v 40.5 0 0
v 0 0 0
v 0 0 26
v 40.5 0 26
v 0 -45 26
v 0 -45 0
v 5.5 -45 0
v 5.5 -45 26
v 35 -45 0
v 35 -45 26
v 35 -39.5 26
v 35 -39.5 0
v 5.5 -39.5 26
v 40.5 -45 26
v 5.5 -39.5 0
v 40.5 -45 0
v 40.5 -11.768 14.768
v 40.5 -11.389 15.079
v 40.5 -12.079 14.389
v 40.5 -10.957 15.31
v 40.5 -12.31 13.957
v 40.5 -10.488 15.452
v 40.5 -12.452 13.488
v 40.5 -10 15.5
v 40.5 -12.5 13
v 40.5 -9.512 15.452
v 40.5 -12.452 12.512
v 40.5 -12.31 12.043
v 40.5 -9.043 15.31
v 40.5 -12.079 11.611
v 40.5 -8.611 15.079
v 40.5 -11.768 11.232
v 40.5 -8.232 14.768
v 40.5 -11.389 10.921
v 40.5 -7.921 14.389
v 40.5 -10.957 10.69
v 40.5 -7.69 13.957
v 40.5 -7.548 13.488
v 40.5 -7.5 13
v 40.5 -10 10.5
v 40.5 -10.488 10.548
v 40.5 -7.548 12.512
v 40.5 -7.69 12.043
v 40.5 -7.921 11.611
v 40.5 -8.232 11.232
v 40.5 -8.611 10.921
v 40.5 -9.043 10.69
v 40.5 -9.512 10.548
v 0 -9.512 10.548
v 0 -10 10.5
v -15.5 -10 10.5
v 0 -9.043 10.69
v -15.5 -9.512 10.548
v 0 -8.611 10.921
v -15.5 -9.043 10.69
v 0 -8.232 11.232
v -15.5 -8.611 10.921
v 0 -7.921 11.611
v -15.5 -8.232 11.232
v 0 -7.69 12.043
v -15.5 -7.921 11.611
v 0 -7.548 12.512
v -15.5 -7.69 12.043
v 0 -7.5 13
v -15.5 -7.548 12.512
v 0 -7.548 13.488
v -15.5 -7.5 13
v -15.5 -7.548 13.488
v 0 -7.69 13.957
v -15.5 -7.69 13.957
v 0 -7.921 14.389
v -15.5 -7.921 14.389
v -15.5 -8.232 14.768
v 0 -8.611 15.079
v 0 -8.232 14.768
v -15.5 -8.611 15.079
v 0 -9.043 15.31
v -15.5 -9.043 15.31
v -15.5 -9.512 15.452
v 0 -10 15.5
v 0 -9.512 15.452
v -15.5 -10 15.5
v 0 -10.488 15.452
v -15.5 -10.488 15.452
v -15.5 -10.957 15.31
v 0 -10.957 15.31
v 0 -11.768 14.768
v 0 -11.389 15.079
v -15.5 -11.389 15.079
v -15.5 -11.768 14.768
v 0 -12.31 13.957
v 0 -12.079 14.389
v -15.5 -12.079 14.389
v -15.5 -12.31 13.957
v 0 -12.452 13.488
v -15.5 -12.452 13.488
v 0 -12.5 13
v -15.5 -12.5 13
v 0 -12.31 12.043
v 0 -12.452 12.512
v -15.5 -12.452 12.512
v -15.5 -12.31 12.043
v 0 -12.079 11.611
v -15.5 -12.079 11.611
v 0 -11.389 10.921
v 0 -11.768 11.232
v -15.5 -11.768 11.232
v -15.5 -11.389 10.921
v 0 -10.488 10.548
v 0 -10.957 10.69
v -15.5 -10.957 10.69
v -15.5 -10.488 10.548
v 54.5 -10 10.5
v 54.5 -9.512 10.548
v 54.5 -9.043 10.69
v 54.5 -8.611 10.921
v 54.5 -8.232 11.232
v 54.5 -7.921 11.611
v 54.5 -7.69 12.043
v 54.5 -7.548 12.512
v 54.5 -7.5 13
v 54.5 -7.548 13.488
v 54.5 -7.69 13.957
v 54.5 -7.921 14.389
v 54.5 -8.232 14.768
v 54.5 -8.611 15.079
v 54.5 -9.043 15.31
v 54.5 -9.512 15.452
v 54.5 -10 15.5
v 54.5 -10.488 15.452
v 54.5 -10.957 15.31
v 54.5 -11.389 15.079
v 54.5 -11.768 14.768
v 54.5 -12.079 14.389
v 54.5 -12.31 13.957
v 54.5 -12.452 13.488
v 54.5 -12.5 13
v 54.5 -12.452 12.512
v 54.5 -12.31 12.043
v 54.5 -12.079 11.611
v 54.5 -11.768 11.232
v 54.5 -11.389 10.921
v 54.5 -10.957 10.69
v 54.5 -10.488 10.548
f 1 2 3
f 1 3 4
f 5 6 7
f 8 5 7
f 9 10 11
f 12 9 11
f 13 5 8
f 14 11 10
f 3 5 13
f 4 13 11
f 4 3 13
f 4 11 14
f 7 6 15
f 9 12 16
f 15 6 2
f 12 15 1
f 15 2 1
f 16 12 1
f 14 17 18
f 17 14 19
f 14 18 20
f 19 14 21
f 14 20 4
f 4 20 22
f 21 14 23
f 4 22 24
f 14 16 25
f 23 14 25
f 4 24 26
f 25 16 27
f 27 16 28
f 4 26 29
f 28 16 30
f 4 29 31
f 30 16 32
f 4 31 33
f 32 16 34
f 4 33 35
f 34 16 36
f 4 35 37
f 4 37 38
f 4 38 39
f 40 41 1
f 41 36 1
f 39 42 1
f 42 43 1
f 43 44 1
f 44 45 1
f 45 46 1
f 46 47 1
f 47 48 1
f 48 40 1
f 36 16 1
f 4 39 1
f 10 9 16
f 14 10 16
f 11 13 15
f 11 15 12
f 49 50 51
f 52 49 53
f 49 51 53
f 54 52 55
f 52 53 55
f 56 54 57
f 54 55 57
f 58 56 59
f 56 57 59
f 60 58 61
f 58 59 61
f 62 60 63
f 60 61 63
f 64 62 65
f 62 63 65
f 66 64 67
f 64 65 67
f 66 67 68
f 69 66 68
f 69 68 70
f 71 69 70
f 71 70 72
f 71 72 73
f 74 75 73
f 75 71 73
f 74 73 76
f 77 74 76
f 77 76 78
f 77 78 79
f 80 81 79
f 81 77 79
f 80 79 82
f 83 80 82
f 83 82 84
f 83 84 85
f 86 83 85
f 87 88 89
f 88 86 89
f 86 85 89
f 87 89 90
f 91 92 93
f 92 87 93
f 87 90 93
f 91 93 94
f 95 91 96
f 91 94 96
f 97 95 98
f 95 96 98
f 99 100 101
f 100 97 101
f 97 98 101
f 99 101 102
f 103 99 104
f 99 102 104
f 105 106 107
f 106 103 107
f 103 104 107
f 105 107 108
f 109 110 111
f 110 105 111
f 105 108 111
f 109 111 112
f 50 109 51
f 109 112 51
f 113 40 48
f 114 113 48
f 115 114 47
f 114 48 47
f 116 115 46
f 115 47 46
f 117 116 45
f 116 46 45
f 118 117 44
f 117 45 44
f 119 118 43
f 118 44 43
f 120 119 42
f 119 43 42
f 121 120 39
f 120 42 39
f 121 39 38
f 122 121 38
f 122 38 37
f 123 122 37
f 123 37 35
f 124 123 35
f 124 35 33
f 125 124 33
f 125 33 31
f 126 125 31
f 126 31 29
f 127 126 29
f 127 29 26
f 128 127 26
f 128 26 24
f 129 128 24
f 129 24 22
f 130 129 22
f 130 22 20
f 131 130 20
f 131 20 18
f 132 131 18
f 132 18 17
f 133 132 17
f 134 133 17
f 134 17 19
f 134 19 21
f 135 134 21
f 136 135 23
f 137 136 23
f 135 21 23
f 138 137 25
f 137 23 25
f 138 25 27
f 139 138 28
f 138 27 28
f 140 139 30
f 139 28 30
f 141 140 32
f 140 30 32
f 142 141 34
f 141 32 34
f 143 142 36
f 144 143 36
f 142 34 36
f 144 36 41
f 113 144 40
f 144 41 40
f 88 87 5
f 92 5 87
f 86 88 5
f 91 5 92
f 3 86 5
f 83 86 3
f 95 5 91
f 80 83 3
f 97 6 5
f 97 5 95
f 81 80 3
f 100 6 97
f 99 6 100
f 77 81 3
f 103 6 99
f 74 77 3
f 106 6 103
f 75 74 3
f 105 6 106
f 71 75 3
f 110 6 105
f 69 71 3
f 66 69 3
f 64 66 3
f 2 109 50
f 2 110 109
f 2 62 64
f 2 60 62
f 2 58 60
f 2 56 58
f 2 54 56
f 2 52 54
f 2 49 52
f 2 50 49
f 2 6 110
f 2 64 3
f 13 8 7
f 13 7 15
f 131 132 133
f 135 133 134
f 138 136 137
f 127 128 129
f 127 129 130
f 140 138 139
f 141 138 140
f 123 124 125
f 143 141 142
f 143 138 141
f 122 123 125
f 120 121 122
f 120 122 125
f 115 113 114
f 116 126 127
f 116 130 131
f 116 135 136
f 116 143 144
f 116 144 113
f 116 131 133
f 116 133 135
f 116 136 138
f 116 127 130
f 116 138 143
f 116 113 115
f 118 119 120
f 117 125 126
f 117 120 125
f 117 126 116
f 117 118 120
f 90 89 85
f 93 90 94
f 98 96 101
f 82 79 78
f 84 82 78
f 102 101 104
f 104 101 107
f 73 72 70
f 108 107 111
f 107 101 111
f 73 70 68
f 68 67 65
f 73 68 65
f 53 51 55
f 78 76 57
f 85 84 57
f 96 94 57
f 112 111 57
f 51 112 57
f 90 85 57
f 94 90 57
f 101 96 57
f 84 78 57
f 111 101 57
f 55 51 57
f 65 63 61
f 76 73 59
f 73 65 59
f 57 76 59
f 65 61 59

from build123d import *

# Parameters (mm, degrees)
SKETCH_1_W           = 40.5
SKETCH_1_H           = 45
EXTRUDE_1_DEPTH      = 26
SKETCH_2_W           = 29.5
SKETCH_2_H           = 5.5
CUT_EXTRUDE_1_DEPTH  = 38
EXTRUDE_2_DEPTH      = 14
EXTRUDE_2_DEPTH_BACK = 56
SKETCH_3_R           = 2.5


with BuildPart() as part:
    # 草图1 → 凸台-拉伸1 (new body)
    with BuildSketch(Plane.XY):
        with Locations((20.25, -22.5)):
            Rectangle(SKETCH_1_W, SKETCH_1_H)
    extrude(amount=EXTRUDE_1_DEPTH)

    # 草图2 → 切除-拉伸1 (cut)
    with BuildSketch(Plane.XY.offset(26)):
        with Locations((20.25, -42.25)):
            Rectangle(SKETCH_2_W, SKETCH_2_H)
    extrude(amount=-CUT_EXTRUDE_1_DEPTH, mode=Mode.SUBTRACT)

    # 草图3 → 凸台-拉伸2 (add, two sides: drawn at the far end of the back side and taken through both)
    with BuildSketch(Plane(origin=(40.5, 0, 0), x_dir=(0, 0, -1), z_dir=(1, 0, 0)).offset(-EXTRUDE_2_DEPTH_BACK)):
        with Locations((-13, -10)):
            Circle(SKETCH_3_R)
    extrude(amount=EXTRUDE_2_DEPTH + EXTRUDE_2_DEPTH_BACK)


solid = part.part
